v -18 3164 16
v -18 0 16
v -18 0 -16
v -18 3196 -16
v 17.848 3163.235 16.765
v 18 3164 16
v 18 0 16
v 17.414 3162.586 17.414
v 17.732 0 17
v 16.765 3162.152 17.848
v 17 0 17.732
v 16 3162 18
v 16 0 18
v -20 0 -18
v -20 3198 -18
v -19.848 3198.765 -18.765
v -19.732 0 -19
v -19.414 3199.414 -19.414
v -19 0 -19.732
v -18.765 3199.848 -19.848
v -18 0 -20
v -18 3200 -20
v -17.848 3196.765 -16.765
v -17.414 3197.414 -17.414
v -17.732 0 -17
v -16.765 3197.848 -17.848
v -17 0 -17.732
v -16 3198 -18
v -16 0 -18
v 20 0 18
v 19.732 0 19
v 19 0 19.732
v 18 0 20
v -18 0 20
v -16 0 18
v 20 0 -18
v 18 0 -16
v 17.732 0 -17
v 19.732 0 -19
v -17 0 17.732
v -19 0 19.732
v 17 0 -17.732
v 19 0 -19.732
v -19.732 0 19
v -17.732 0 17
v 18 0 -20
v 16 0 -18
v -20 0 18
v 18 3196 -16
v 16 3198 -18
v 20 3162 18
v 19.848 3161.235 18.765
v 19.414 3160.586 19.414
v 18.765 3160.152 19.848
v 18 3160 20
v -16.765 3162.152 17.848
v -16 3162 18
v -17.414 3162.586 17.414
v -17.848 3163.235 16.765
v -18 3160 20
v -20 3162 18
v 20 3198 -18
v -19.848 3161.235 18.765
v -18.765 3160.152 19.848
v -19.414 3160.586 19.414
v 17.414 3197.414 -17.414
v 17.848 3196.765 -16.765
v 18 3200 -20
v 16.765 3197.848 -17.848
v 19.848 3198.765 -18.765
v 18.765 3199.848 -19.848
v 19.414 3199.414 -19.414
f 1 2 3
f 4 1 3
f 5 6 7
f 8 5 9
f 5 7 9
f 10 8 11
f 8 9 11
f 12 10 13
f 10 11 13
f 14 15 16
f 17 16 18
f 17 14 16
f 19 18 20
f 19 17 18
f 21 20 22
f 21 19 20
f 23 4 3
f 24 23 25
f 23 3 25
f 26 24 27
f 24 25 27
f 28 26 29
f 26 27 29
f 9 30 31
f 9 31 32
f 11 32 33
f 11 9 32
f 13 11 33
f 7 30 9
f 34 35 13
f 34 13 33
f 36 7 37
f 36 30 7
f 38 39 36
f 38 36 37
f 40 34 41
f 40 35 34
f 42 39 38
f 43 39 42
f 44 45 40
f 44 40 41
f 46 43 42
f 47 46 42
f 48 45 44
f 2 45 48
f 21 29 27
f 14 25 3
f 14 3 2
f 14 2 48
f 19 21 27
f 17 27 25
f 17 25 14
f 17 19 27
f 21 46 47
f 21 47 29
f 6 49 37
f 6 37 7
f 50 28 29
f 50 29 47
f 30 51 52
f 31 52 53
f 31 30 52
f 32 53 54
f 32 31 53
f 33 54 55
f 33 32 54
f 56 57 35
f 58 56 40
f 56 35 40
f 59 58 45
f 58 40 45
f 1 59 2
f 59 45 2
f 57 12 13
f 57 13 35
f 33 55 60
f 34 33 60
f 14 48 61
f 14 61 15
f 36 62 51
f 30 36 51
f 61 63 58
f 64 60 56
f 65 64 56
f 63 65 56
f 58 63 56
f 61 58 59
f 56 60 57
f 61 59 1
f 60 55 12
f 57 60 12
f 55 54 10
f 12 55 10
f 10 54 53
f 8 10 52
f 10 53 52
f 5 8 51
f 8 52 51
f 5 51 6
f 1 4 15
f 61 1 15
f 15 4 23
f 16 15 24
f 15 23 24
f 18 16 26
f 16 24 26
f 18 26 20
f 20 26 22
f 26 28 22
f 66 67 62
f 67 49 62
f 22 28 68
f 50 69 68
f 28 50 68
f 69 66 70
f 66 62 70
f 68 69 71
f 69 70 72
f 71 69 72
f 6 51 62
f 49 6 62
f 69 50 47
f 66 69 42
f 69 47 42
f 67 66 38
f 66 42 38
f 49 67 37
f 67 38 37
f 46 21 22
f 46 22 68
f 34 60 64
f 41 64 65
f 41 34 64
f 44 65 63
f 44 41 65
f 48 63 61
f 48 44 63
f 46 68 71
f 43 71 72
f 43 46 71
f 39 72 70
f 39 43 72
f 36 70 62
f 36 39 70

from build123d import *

# Parameters (mm, degrees)
EXTRUDE_1_DEPTH     = 3200
CUT_EXTRUDE_1_DEPTH = 3201.312484743


with BuildPart() as part:
    # Эскиз2 → Бобышка-Вытянуть1 (new body)
    with BuildSketch(Plane(origin=(0, 0, 0), x_dir=(1, 0, 0), z_dir=(0, 1, 0))):
        with BuildLine():
            Line((-18, 20), (18, 20))
            ThreePointArc((18, 20), (19.414213562, 19.414213562), (20, 18))
            Line((20, 18), (20, -18))
            ThreePointArc((20, -18), (19.414213562, -19.414213562), (18, -20))
            Line((18, -20), (-18, -20))
            ThreePointArc((-18, -20), (-19.414213562, -19.414213562), (-20, -18))
            Line((-20, -18), (-20, 18))
            ThreePointArc((-20, 18), (-19.414213562, 19.414213562), (-18, 20))
        make_face()
        with BuildLine():
            Line((16, -18), (-16, -18))
            ThreePointArc((-16, -18), (-17.414213562, -17.414213562), (-18, -16))
            Line((-18, -16), (-18, 16))
            ThreePointArc((-18, 16), (-17.414213562, 17.414213562), (-16, 18))
            Line((-16, 18), (16, 18))
            ThreePointArc((16, 18), (17.414213562, 17.414213562), (18, 16))
            Line((18, 16), (18, -16))
            ThreePointArc((18, -16), (17.414213562, -17.414213562), (16, -18))
        make_face(mode=Mode.SUBTRACT)
    extrude(amount=EXTRUDE_1_DEPTH)

    # Эскиз3 → Вырез-Вытянуть1 (cut, through all)
    with BuildSketch(Plane(origin=(20, 0, 0), x_dir=(0, 0, -1), z_dir=(1, 0, 0))):
        Polygon((20, 3200), (-20, 3200), (-20, 3160), align=None)
    extrude(amount=-CUT_EXTRUDE_1_DEPTH, mode=Mode.SUBTRACT)


solid = part.part
